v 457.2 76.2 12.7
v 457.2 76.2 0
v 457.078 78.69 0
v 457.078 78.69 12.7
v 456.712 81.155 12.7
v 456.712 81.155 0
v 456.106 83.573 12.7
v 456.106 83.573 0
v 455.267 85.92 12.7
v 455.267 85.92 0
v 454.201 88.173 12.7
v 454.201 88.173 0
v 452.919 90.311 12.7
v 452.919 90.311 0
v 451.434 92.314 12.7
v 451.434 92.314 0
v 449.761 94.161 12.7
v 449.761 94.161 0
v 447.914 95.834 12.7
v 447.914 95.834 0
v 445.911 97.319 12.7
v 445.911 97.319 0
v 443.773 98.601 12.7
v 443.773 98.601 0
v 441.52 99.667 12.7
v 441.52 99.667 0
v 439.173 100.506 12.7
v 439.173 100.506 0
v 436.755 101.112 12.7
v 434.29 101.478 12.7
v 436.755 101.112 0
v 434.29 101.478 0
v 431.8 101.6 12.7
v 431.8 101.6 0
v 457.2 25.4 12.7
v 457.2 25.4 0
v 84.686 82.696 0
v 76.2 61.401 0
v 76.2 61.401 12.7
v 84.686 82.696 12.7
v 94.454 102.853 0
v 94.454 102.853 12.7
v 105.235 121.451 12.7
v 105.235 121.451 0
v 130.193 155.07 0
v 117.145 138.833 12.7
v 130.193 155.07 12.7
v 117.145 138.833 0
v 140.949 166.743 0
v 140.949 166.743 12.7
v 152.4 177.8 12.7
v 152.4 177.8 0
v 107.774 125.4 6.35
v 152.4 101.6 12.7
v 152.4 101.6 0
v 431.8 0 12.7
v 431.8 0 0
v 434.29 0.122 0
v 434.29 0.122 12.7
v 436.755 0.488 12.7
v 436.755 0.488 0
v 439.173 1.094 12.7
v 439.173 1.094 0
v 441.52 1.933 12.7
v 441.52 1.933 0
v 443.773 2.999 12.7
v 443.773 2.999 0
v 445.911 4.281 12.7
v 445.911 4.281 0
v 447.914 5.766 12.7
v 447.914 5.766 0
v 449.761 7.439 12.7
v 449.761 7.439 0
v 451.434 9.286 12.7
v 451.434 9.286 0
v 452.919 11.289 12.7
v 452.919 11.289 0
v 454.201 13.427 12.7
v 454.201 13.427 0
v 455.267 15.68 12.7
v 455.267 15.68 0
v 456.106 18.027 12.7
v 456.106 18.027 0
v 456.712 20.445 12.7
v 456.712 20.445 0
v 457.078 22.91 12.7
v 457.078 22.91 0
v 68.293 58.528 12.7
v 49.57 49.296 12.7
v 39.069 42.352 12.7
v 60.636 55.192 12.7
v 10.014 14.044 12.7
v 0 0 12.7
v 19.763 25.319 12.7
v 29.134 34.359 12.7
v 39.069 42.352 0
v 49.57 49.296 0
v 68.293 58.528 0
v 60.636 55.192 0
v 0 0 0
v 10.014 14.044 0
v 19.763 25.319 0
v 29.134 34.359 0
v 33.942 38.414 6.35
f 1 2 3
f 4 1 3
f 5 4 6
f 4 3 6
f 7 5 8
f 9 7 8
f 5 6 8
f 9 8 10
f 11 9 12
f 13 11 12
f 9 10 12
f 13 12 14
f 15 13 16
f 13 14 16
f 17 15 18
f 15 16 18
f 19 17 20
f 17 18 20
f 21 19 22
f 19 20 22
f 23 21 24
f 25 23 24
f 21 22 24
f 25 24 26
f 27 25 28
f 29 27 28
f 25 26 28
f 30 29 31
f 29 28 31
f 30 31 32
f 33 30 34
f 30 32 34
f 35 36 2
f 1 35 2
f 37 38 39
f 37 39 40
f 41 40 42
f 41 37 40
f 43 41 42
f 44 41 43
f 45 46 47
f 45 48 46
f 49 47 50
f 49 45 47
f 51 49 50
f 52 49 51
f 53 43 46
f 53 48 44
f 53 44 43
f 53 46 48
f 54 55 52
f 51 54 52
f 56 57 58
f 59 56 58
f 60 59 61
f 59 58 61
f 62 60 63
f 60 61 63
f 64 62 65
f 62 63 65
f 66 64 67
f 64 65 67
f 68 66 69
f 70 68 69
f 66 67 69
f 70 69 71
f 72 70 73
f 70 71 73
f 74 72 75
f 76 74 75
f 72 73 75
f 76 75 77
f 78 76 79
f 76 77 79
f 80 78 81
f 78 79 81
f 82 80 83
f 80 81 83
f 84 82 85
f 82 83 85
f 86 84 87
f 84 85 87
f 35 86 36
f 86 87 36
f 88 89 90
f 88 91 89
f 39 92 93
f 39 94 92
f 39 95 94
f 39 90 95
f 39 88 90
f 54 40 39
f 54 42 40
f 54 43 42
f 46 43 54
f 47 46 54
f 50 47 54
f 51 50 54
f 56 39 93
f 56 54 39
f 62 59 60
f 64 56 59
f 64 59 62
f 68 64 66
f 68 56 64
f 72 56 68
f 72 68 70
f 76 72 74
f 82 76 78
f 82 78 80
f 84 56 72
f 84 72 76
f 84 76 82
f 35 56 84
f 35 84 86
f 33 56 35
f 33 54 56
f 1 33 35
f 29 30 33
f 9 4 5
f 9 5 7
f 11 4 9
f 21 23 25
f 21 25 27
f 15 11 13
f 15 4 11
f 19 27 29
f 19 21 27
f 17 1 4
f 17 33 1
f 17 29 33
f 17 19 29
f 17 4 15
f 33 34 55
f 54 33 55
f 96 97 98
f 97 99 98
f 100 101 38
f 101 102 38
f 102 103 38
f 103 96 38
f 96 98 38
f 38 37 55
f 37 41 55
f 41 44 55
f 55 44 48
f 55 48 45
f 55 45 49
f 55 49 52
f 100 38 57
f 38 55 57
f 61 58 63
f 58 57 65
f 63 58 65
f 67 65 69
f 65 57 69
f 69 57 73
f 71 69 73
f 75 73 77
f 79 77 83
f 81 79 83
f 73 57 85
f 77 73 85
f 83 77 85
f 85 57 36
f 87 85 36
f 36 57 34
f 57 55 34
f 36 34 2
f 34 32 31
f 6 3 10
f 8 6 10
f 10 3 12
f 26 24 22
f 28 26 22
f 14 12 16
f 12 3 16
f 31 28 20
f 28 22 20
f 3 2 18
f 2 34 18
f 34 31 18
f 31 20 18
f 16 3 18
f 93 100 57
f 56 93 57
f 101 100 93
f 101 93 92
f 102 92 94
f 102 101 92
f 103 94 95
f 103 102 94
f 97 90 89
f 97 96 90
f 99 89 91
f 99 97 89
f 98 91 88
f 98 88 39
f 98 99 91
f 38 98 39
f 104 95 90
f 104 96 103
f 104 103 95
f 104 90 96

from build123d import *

# Parameters (mm, degrees)
BOSS_EXTRUDE1_DEPTH = 12.7


with BuildPart() as part:
    # Sketch2 → Boss-Extrude1 (new body)
    with BuildSketch(Plane.XY):
        with BuildLine():
            Line((0, 0), (431.8, 0))
            ThreePointArc((431.8, 0), (449.760512242, 7.439487758), (457.2, 25.4))
            Line((457.2, 25.4), (457.2, 76.2))
            ThreePointArc((457.2, 76.2), (449.760512242, 94.160512242), (431.8, 101.6))
            Line((431.8, 101.6), (152.4, 101.6))
            Line((152.4, 101.6), (152.4, 177.8))
            add(Edge.make_bspline(
                [(76.2, 61.401256844), (101.247409755, 131.199229676), (152.4, 177.8)],
                knots=[0, 0, 0, 0.857766608, 0.857766608, 0.857766608], degree=2))
            add(Edge.make_bspline(
                [(0, 0), (29.783016718, 46.127848409), (76.2, 61.401256844)],
                knots=[0, 0, 0, 0.939645984, 0.939645984, 0.939645984], degree=2))
        make_face()
    extrude(amount=BOSS_EXTRUDE1_DEPTH)


solid = part.part
